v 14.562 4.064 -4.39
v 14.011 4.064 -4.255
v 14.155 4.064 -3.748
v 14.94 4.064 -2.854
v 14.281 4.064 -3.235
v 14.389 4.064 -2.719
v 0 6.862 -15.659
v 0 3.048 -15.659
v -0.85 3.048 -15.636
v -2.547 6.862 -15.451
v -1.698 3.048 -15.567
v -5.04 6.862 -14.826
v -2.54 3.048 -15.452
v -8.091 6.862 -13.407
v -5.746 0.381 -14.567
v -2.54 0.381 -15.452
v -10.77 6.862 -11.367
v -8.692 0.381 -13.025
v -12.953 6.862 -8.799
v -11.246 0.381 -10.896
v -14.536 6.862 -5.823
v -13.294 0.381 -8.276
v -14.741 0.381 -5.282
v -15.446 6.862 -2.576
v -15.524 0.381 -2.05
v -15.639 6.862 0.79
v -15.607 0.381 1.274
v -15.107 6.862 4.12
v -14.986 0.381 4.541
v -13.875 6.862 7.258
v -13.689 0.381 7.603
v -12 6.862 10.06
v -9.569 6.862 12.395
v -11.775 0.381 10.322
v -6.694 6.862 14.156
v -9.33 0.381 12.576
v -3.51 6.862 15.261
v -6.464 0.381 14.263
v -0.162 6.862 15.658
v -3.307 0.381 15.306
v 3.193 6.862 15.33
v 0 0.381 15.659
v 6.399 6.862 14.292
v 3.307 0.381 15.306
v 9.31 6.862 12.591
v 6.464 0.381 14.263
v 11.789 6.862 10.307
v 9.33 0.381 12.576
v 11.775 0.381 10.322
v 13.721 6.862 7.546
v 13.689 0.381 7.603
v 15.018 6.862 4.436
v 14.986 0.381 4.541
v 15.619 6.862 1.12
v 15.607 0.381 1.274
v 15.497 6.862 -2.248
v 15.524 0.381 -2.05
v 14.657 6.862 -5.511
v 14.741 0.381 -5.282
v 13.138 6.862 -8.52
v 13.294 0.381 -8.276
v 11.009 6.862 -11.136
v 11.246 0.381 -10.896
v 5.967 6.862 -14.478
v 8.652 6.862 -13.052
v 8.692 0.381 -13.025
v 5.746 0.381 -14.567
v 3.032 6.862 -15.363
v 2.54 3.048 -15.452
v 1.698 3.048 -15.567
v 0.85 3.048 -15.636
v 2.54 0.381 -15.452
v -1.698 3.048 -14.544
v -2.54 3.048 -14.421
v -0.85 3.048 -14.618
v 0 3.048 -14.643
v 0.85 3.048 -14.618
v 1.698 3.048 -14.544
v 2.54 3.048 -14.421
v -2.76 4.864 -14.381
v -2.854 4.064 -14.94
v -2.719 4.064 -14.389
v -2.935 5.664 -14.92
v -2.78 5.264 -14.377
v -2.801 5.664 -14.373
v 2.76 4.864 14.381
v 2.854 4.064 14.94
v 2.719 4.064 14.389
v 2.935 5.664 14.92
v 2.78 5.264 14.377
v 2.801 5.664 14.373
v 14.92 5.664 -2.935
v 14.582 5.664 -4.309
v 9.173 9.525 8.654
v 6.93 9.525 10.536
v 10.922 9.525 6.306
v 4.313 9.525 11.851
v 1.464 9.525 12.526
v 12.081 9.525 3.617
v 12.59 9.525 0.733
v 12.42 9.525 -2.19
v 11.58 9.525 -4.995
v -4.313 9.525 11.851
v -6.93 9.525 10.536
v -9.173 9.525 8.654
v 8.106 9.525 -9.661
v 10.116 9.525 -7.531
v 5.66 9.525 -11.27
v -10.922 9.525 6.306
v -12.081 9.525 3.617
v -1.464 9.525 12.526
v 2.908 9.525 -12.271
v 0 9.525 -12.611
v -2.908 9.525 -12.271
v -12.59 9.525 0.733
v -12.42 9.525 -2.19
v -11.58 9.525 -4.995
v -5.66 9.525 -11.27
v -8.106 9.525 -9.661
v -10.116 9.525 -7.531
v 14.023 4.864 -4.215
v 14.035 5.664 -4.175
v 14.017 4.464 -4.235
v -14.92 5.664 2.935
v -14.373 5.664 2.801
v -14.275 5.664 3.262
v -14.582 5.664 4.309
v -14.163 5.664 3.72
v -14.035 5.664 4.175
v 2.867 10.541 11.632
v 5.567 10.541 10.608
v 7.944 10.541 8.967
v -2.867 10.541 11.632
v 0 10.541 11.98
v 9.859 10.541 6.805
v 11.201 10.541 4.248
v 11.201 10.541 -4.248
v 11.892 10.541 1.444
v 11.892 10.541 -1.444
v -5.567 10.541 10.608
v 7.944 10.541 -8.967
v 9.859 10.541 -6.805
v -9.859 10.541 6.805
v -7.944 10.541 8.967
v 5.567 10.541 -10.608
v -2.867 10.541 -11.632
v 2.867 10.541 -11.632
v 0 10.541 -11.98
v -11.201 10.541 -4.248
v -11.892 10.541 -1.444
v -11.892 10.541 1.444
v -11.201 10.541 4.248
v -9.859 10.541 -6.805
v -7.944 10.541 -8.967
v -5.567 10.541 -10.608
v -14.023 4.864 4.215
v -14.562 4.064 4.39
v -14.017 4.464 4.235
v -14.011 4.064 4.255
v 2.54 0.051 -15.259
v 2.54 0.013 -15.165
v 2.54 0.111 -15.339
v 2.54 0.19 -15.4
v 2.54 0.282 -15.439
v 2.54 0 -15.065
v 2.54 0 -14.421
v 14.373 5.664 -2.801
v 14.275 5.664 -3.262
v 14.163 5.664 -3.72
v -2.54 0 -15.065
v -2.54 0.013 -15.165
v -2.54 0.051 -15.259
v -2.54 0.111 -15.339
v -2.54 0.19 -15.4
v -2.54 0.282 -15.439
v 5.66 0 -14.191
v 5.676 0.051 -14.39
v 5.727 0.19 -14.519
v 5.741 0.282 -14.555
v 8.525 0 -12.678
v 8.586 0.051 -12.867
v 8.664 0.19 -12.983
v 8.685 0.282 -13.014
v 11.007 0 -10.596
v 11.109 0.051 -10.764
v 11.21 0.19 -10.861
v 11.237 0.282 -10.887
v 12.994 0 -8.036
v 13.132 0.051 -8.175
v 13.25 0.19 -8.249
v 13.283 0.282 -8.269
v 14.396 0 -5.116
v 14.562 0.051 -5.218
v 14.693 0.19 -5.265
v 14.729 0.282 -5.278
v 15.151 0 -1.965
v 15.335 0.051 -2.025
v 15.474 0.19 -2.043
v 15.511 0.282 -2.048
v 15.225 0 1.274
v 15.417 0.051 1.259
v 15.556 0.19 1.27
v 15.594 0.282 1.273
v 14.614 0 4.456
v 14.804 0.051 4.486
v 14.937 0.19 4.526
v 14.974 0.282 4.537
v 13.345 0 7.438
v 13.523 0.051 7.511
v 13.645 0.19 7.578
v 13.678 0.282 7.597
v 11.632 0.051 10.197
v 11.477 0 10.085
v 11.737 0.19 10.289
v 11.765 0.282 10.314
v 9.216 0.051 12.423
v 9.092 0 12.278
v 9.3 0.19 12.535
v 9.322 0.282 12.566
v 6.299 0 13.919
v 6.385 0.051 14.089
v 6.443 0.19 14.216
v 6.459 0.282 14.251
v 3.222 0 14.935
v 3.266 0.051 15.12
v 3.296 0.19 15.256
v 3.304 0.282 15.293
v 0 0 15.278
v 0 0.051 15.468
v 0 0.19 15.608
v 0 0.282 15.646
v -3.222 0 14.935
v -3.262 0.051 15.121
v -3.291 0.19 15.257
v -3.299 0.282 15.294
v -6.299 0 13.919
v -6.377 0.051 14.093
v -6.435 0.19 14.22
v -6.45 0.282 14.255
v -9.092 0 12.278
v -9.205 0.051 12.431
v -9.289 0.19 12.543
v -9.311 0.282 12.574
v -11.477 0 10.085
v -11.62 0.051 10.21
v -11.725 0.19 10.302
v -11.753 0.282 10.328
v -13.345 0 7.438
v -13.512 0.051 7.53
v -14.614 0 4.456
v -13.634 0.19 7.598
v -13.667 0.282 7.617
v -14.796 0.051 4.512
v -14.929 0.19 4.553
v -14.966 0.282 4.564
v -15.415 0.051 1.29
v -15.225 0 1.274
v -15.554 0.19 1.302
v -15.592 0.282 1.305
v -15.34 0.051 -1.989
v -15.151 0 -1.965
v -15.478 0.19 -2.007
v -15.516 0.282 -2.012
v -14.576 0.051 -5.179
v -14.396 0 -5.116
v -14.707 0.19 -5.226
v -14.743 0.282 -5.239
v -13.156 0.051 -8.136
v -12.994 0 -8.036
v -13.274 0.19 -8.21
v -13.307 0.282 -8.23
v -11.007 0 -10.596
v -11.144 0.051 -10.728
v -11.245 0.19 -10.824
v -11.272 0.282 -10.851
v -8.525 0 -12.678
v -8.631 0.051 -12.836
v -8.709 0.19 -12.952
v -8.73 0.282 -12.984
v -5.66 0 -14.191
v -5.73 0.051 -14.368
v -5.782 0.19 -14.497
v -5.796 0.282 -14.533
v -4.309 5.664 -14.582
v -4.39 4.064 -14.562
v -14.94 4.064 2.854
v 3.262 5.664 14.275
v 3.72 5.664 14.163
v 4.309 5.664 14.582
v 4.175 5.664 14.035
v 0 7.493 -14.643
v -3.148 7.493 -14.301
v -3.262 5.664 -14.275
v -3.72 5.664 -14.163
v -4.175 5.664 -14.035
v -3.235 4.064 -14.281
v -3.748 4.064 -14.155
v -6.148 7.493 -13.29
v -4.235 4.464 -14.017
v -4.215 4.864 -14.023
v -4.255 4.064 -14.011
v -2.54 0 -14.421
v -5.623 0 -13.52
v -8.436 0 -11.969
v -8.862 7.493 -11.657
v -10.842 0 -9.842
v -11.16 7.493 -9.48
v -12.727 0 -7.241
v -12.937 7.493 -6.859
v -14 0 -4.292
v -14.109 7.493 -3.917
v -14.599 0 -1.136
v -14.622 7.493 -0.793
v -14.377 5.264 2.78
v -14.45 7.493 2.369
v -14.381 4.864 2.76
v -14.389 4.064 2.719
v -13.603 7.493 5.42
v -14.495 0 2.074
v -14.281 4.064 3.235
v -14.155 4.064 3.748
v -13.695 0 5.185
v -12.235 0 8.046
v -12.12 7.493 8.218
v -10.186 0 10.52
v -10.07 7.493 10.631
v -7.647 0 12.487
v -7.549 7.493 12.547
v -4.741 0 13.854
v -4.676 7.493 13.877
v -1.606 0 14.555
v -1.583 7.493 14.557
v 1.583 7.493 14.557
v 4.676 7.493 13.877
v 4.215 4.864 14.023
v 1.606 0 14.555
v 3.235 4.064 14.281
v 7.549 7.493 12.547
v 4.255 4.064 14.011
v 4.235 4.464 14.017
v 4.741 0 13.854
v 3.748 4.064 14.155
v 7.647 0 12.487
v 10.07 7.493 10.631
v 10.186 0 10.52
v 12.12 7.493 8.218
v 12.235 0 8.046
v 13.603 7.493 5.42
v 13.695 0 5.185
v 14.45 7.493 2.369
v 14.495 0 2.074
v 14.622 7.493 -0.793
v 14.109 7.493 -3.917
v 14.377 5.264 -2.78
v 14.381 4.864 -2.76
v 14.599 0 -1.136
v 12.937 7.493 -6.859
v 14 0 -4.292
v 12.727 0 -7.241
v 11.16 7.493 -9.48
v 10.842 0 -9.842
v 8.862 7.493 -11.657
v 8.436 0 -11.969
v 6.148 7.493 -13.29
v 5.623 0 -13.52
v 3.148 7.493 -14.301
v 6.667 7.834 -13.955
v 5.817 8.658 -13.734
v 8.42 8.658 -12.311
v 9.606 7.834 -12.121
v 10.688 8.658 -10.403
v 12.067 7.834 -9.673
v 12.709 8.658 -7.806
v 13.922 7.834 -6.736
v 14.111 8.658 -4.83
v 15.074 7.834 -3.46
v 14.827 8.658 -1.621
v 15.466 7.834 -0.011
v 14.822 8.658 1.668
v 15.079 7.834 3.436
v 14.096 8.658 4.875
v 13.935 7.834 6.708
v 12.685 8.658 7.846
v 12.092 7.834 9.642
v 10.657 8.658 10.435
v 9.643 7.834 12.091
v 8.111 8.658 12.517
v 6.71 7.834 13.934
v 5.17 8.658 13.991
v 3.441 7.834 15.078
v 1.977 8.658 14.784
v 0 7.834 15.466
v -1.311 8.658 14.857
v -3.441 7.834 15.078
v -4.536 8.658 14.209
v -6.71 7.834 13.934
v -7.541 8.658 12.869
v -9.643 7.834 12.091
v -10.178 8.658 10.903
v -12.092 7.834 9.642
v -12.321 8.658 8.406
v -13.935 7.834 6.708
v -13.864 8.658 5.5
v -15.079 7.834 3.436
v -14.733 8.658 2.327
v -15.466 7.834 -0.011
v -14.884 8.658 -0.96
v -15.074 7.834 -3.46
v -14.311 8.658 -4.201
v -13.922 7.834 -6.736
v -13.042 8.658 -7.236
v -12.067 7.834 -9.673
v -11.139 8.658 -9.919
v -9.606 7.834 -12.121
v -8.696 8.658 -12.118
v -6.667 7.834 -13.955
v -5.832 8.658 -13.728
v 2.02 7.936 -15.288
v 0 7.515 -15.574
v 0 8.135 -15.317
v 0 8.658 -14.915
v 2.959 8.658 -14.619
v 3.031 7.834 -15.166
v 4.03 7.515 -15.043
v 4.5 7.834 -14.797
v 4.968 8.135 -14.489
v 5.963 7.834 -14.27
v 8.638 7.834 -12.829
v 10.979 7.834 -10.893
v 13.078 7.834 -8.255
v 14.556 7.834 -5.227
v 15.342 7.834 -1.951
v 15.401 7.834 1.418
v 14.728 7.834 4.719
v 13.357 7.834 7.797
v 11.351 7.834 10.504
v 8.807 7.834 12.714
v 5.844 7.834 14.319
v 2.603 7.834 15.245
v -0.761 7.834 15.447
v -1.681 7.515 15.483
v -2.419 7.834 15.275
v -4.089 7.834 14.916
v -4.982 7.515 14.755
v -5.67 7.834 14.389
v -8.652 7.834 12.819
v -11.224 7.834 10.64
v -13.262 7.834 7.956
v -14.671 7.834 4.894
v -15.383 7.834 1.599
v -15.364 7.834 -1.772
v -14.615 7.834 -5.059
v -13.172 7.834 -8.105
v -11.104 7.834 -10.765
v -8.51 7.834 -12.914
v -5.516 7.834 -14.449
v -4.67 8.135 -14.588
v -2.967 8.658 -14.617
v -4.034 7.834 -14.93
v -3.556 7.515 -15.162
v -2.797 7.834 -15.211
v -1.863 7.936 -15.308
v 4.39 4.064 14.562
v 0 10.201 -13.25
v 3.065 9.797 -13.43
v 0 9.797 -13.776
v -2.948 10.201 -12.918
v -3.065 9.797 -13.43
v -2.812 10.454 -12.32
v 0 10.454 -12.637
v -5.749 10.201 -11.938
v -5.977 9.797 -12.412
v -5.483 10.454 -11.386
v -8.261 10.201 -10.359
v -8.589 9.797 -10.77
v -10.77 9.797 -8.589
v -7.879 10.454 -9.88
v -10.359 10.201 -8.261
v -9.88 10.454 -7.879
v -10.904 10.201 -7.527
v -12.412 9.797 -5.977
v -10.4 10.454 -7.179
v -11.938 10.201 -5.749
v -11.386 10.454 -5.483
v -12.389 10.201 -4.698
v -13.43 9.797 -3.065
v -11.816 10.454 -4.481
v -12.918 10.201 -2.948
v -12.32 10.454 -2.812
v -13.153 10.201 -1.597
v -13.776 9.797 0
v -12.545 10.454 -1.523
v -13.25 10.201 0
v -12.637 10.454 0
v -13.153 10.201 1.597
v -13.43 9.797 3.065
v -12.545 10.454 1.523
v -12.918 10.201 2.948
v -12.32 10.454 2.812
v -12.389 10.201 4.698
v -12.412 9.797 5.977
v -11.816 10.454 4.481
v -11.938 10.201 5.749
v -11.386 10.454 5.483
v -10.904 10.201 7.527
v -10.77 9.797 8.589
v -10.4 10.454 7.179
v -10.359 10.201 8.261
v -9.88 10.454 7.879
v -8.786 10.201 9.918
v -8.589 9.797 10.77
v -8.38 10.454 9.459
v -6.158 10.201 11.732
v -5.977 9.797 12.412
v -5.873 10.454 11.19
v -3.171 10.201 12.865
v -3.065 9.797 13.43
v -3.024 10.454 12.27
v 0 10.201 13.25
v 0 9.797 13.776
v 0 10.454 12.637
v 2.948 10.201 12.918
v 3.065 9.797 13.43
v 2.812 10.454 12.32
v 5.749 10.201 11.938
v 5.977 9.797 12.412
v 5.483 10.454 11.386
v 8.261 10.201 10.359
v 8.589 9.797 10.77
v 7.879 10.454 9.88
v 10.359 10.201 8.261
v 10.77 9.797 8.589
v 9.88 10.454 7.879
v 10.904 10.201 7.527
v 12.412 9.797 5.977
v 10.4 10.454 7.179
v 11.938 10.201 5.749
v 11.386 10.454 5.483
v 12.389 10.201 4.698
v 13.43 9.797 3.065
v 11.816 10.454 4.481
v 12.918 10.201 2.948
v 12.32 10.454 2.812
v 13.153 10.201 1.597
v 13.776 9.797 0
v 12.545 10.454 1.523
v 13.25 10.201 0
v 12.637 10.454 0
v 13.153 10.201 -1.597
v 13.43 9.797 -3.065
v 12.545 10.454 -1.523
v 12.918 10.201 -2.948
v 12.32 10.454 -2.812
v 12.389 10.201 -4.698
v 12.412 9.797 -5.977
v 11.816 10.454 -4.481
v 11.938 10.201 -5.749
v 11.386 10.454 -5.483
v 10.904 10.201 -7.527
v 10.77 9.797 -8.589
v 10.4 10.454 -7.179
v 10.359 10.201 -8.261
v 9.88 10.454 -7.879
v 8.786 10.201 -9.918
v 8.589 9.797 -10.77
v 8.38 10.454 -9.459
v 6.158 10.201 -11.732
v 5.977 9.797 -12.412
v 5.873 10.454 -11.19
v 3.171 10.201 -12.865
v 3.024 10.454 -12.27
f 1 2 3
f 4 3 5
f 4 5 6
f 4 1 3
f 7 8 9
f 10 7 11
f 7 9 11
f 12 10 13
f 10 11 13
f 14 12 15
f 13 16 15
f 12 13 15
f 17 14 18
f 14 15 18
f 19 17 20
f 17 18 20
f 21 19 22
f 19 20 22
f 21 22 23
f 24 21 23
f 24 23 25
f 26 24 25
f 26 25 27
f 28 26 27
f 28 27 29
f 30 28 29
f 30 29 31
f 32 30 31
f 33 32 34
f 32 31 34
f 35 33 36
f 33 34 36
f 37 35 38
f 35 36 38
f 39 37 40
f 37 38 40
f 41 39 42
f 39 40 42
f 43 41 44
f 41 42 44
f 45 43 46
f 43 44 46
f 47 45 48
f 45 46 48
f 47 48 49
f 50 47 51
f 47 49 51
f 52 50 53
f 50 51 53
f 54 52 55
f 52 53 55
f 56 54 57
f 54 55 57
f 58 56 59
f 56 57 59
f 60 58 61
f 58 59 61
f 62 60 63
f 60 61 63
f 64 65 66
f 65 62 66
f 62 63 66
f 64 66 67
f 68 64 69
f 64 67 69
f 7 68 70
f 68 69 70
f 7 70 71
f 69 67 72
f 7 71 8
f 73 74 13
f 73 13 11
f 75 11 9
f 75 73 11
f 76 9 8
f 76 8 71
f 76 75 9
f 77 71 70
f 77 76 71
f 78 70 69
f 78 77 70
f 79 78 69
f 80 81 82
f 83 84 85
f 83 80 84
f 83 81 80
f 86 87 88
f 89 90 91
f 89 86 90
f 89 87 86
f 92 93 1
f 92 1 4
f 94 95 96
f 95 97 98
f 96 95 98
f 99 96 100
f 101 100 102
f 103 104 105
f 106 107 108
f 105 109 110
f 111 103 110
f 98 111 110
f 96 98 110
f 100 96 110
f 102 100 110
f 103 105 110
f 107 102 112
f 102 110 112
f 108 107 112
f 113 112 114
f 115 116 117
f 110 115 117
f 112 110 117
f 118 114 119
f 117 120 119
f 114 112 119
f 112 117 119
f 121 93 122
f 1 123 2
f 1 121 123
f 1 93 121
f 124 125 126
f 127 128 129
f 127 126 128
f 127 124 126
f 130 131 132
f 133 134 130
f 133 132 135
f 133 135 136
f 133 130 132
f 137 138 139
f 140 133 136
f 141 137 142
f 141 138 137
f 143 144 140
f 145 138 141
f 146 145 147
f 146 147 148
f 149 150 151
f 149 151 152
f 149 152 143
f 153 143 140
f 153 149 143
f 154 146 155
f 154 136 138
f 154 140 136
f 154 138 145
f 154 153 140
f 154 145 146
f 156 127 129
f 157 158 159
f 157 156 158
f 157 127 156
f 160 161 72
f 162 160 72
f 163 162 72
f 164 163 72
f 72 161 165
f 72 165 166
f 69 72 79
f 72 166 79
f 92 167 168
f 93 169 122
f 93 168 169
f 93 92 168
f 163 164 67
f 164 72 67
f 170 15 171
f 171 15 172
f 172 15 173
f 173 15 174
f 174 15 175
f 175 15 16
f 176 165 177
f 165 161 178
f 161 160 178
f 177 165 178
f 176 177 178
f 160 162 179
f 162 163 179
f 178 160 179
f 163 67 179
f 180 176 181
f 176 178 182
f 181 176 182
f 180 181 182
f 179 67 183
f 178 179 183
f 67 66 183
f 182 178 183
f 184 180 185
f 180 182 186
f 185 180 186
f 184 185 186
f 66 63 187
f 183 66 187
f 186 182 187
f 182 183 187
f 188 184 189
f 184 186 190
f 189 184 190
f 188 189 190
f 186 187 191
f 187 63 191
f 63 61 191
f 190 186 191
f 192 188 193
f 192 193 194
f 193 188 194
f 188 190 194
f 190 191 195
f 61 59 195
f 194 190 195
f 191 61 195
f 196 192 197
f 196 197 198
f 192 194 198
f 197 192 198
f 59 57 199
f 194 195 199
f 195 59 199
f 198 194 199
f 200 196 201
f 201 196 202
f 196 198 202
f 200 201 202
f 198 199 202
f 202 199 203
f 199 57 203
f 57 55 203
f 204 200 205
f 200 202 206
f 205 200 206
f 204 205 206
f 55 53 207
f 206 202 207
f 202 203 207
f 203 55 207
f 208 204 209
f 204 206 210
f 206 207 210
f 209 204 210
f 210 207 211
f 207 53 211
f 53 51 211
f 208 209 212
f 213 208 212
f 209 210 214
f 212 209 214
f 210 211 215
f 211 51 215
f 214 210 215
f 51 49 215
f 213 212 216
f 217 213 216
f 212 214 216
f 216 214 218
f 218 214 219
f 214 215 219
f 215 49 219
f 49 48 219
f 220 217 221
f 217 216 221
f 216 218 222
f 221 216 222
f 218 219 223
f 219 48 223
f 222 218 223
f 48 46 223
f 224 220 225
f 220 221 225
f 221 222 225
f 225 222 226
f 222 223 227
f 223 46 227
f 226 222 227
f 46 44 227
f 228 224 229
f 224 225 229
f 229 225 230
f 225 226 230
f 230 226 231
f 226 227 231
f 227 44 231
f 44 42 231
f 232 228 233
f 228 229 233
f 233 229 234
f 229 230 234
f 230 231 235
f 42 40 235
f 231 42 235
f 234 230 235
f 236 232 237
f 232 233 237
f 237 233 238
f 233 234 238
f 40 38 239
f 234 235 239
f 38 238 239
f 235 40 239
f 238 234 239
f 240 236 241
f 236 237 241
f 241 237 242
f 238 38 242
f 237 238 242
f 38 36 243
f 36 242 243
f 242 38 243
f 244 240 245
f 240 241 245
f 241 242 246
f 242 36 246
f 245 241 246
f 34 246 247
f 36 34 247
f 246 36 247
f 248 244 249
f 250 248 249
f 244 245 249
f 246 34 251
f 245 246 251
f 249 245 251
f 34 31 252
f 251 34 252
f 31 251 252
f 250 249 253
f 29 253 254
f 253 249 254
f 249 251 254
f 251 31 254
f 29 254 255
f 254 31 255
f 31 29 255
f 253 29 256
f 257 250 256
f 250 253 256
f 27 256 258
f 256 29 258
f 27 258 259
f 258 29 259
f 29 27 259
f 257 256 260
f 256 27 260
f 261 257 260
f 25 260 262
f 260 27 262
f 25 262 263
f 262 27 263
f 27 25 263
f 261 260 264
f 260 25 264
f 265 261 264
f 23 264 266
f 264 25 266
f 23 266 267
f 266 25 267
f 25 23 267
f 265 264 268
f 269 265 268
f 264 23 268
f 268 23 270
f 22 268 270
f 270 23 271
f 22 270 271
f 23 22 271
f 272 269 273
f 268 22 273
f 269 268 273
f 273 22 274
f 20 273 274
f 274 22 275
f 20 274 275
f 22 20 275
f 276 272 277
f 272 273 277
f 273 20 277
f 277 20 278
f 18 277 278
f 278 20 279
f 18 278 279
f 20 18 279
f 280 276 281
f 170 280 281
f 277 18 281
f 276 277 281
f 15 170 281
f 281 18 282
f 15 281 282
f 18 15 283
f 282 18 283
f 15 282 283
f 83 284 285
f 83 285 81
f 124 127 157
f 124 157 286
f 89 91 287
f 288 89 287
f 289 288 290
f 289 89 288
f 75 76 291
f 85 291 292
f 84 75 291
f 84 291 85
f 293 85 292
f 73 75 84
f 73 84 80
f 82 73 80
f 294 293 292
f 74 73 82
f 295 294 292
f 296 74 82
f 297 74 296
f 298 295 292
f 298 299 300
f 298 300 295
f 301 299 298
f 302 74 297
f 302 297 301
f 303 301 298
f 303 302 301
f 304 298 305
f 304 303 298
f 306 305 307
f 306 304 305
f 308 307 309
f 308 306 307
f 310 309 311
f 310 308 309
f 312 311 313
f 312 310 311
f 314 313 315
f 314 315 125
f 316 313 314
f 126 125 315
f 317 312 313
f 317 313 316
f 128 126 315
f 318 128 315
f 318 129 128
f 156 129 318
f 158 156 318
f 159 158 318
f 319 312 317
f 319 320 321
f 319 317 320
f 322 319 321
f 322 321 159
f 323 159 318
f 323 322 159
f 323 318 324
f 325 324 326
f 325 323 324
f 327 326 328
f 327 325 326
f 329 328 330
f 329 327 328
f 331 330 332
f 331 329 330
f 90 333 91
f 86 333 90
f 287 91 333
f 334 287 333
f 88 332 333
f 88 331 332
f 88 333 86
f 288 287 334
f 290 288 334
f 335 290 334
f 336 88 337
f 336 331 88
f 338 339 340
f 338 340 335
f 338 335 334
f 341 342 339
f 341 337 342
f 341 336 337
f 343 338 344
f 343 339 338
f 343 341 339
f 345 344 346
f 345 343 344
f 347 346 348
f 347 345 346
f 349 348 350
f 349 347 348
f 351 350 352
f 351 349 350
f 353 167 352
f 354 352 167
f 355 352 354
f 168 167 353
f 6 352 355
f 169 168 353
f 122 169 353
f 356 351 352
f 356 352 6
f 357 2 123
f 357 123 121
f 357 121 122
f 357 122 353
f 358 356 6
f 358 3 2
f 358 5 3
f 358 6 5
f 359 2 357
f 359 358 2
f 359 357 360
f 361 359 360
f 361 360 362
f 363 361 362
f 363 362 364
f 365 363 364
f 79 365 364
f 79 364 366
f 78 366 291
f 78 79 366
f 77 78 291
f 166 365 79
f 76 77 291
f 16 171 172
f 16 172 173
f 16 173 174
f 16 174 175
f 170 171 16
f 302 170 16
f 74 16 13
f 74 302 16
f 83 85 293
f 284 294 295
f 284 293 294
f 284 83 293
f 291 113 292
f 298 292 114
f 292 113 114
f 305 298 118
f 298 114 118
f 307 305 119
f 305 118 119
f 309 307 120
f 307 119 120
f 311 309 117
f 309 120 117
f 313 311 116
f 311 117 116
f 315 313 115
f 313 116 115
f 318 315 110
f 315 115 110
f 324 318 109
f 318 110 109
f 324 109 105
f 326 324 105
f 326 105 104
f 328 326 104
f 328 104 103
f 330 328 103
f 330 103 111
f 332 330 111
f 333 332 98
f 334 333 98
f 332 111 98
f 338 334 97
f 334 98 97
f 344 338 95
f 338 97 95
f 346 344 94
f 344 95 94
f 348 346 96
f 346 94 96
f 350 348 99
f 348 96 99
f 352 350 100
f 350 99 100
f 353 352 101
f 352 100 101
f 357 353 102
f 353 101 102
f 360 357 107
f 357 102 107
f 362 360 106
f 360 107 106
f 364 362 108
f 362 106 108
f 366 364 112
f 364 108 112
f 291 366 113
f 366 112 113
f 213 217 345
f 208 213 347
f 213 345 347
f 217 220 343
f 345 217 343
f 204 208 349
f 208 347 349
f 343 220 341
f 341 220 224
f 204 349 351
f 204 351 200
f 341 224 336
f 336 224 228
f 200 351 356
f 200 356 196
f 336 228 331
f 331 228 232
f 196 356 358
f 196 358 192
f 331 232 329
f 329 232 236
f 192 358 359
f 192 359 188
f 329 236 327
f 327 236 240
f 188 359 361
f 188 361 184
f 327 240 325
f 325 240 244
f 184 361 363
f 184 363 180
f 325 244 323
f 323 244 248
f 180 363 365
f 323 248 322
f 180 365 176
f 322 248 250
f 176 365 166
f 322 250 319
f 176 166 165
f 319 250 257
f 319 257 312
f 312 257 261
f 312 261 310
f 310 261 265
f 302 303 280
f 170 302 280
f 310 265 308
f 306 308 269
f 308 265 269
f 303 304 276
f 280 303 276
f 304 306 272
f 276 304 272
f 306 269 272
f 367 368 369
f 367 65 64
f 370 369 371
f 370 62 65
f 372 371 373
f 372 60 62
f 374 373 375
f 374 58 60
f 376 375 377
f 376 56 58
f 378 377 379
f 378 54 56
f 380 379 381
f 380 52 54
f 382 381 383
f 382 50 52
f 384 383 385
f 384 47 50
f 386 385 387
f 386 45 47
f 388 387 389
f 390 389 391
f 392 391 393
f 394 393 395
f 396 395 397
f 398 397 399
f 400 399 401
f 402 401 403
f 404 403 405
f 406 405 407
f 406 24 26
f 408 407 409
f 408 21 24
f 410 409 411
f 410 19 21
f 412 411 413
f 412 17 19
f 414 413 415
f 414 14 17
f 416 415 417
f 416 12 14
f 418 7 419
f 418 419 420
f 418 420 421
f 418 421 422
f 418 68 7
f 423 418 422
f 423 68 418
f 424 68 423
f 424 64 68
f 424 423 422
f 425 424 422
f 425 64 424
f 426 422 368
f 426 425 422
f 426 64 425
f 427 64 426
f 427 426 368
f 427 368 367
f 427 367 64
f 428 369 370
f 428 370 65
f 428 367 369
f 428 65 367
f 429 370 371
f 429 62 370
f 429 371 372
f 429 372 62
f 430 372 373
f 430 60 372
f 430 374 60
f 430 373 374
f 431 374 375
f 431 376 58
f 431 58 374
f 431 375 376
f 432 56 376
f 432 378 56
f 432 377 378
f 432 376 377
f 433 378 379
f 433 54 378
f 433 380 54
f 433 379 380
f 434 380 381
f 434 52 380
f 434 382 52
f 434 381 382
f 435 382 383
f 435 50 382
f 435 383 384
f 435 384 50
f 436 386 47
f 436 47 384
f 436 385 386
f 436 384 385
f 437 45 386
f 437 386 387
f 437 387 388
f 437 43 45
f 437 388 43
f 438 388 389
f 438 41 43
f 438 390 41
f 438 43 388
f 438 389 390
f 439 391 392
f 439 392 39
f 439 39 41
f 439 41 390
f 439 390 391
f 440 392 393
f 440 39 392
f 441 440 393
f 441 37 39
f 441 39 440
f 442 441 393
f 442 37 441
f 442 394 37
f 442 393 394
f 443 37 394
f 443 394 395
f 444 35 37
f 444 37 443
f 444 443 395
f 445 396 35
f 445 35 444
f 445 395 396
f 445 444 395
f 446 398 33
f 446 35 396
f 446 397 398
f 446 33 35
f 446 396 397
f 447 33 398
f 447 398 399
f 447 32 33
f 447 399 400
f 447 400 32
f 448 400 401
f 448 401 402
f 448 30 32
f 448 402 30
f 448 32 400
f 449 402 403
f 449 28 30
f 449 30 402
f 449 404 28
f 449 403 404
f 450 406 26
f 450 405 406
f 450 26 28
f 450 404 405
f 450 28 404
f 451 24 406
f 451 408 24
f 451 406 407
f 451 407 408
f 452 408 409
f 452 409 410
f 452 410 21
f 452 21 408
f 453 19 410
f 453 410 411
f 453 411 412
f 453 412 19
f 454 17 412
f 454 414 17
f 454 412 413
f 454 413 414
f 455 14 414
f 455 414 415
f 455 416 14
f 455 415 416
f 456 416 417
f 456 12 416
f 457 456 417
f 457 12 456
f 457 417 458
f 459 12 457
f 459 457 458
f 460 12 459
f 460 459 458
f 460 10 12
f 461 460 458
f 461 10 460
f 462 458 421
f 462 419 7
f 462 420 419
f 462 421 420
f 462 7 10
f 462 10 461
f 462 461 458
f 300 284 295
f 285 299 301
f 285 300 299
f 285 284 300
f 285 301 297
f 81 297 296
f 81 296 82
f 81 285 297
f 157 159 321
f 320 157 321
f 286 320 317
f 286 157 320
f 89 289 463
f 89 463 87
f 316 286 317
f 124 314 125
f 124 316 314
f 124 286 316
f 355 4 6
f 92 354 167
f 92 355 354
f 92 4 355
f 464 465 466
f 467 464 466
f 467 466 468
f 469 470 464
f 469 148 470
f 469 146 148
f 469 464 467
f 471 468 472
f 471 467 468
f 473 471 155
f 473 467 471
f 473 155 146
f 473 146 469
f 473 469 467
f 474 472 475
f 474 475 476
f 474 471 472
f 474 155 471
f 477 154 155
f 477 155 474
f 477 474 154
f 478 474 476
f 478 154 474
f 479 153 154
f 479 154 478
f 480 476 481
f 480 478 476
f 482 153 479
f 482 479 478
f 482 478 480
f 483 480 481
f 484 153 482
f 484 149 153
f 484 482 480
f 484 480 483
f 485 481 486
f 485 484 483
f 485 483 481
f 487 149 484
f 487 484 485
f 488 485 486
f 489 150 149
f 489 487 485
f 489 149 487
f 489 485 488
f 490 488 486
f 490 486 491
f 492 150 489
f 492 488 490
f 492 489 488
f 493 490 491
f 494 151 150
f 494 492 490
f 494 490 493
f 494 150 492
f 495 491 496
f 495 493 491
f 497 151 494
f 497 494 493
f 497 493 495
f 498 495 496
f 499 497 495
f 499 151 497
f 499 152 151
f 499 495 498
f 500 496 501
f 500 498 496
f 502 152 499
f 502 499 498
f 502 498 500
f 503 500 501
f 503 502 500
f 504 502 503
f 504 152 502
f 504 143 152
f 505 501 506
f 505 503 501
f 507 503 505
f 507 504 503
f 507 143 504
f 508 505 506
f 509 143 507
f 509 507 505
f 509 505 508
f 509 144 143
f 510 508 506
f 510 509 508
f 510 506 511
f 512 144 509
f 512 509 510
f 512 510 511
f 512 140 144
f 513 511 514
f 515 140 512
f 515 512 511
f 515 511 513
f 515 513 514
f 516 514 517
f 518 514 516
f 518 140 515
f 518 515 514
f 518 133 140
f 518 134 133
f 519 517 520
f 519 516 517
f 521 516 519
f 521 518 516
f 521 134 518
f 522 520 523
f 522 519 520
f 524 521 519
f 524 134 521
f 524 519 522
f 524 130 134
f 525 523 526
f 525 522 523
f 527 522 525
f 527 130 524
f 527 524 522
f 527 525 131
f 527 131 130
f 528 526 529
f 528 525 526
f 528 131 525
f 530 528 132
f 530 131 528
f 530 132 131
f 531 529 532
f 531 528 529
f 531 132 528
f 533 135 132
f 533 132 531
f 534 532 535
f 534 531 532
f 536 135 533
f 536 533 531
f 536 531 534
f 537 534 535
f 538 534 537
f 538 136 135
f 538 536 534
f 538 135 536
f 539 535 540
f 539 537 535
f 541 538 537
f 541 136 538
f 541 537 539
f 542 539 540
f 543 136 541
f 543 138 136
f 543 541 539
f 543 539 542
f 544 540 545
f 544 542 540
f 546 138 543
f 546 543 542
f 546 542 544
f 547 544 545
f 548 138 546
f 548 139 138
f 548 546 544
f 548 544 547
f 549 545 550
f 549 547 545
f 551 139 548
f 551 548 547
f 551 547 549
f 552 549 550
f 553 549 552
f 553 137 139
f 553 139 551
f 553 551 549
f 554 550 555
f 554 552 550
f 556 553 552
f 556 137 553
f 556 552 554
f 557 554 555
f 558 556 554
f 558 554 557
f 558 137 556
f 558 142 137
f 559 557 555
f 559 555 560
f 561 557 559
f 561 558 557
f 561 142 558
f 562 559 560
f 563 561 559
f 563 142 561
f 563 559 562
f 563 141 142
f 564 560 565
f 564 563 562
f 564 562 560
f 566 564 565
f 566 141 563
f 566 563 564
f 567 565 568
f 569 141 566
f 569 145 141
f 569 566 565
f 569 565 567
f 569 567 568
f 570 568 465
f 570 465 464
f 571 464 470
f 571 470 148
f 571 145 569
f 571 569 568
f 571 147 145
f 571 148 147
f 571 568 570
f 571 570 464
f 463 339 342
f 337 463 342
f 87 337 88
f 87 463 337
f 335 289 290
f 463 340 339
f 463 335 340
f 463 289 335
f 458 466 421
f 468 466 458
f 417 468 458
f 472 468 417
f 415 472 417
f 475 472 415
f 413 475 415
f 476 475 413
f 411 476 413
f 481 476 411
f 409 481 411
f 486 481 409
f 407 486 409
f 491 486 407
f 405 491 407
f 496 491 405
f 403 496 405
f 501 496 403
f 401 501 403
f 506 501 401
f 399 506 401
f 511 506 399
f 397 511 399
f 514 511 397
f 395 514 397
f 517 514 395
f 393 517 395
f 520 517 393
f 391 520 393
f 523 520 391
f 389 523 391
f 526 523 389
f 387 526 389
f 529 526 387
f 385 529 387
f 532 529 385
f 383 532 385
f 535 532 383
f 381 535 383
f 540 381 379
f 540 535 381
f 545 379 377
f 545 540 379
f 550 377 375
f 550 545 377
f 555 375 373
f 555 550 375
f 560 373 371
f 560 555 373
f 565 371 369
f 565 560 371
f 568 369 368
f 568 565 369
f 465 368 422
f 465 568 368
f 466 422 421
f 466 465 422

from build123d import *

# Parameters (mm, degrees)
SKETCH1_R           = 14.6431
BOSS_EXTRUDE1_DEPTH = 9.525
FILLET1_SIZE        = 2.032
SHELL1_T            = 1.016
SKETCH2_W           = 5.08
SKETCH2_H           = 3.048
CUT_EXTRUDE1_DEPTH  = 25.4
FILLET2_R           = 0.381
SNAP_START          = -15.1892
SNAP_GROOVE1_DEPTH  = 0.567483728
CIRPATTERN2_COUNT   = 4
FILLET3_R           = 2.54
FILLET4_R           = 2.54


# Read off the part's stored shape, not the designer's step: Snap Groove1
with BuildPart() as part:
    # Sketch1 → Boss-Extrude1 (new body)
    with BuildSketch(Plane(origin=(0, 0, 0), x_dir=(1, 0, 0), z_dir=(0, 1, 0))):
        with Locations(Location((0, 0, 0), (0, 0, 90))):
            Circle(SKETCH1_R)
    extrude(amount=BOSS_EXTRUDE1_DEPTH)

    # Fillet1
    fillet1_edges = [part.edges().sort_by_distance(p)[0] for p in [
        (0, 9.525, 14.6431),
    ]]
    chamfer(fillet1_edges, length=FILLET1_SIZE)

    # Shell1
    shell1_openings = [part.faces().sort_by_distance(p)[0] for p in [
        (0, 0, 0),
    ]]
    offset(amount=SHELL1_T, openings=shell1_openings, kind=Kind.INTERSECTION)

    # Sketch2 → Cut-Extrude1 (cut)
    with BuildSketch(Plane.XY):
        with Locations((0, 1.524)):
            Rectangle(SKETCH2_W, SKETCH2_H)
    extrude(amount=-CUT_EXTRUDE1_DEPTH, mode=Mode.SUBTRACT)

    # Fillet2
    fillet2_edges = [part.edges().sort_by_distance(p)[0] for p in [
        (0, 0, 15.6591),
    ]]
    fillet(fillet2_edges, radius=FILLET2_R)

    # Snap Groove1 outline → Snap Groove1 (cut)
    with BuildSketch(Plane(origin=(0, 0, 0), x_dir=(0.9711506345911166, 0, -0.23846686338623996), z_dir=(0.23846686338623993, 0, 0.9711506345911166)).offset(SNAP_START)):
        Polygon((-0.707206527, 5.6642), (-0.791069456, 4.064), (0.791069456, 4.064), (0.707206527, 5.6642), align=None)
    snap_groove1 = extrude(amount=SNAP_GROOVE1_DEPTH, mode=Mode.SUBTRACT)

    # CirPattern2: Snap Groove1 ×4 about axis
    cirpattern2_axis = Axis((0, 0, 0), (0, 1, 0))
    for i in range(1, CIRPATTERN2_COUNT):
        add(snap_groove1.rotate(cirpattern2_axis, i * 360 / CIRPATTERN2_COUNT), mode=Mode.SUBTRACT)

    # Fillet3
    fillet3_edges = [part.edges().sort_by_distance(p)[0] for p in [
        (0, 7.913840979, 15.6591),
    ]]
    fillet(fillet3_edges, radius=FILLET3_R)

    # Fillet4
    fillet4_edges = [part.edges().sort_by_distance(p)[0] for p in [
        (0, 10.541, 13.031940979),
    ]]
    fillet(fillet4_edges, radius=FILLET4_R)


solid = part.part
